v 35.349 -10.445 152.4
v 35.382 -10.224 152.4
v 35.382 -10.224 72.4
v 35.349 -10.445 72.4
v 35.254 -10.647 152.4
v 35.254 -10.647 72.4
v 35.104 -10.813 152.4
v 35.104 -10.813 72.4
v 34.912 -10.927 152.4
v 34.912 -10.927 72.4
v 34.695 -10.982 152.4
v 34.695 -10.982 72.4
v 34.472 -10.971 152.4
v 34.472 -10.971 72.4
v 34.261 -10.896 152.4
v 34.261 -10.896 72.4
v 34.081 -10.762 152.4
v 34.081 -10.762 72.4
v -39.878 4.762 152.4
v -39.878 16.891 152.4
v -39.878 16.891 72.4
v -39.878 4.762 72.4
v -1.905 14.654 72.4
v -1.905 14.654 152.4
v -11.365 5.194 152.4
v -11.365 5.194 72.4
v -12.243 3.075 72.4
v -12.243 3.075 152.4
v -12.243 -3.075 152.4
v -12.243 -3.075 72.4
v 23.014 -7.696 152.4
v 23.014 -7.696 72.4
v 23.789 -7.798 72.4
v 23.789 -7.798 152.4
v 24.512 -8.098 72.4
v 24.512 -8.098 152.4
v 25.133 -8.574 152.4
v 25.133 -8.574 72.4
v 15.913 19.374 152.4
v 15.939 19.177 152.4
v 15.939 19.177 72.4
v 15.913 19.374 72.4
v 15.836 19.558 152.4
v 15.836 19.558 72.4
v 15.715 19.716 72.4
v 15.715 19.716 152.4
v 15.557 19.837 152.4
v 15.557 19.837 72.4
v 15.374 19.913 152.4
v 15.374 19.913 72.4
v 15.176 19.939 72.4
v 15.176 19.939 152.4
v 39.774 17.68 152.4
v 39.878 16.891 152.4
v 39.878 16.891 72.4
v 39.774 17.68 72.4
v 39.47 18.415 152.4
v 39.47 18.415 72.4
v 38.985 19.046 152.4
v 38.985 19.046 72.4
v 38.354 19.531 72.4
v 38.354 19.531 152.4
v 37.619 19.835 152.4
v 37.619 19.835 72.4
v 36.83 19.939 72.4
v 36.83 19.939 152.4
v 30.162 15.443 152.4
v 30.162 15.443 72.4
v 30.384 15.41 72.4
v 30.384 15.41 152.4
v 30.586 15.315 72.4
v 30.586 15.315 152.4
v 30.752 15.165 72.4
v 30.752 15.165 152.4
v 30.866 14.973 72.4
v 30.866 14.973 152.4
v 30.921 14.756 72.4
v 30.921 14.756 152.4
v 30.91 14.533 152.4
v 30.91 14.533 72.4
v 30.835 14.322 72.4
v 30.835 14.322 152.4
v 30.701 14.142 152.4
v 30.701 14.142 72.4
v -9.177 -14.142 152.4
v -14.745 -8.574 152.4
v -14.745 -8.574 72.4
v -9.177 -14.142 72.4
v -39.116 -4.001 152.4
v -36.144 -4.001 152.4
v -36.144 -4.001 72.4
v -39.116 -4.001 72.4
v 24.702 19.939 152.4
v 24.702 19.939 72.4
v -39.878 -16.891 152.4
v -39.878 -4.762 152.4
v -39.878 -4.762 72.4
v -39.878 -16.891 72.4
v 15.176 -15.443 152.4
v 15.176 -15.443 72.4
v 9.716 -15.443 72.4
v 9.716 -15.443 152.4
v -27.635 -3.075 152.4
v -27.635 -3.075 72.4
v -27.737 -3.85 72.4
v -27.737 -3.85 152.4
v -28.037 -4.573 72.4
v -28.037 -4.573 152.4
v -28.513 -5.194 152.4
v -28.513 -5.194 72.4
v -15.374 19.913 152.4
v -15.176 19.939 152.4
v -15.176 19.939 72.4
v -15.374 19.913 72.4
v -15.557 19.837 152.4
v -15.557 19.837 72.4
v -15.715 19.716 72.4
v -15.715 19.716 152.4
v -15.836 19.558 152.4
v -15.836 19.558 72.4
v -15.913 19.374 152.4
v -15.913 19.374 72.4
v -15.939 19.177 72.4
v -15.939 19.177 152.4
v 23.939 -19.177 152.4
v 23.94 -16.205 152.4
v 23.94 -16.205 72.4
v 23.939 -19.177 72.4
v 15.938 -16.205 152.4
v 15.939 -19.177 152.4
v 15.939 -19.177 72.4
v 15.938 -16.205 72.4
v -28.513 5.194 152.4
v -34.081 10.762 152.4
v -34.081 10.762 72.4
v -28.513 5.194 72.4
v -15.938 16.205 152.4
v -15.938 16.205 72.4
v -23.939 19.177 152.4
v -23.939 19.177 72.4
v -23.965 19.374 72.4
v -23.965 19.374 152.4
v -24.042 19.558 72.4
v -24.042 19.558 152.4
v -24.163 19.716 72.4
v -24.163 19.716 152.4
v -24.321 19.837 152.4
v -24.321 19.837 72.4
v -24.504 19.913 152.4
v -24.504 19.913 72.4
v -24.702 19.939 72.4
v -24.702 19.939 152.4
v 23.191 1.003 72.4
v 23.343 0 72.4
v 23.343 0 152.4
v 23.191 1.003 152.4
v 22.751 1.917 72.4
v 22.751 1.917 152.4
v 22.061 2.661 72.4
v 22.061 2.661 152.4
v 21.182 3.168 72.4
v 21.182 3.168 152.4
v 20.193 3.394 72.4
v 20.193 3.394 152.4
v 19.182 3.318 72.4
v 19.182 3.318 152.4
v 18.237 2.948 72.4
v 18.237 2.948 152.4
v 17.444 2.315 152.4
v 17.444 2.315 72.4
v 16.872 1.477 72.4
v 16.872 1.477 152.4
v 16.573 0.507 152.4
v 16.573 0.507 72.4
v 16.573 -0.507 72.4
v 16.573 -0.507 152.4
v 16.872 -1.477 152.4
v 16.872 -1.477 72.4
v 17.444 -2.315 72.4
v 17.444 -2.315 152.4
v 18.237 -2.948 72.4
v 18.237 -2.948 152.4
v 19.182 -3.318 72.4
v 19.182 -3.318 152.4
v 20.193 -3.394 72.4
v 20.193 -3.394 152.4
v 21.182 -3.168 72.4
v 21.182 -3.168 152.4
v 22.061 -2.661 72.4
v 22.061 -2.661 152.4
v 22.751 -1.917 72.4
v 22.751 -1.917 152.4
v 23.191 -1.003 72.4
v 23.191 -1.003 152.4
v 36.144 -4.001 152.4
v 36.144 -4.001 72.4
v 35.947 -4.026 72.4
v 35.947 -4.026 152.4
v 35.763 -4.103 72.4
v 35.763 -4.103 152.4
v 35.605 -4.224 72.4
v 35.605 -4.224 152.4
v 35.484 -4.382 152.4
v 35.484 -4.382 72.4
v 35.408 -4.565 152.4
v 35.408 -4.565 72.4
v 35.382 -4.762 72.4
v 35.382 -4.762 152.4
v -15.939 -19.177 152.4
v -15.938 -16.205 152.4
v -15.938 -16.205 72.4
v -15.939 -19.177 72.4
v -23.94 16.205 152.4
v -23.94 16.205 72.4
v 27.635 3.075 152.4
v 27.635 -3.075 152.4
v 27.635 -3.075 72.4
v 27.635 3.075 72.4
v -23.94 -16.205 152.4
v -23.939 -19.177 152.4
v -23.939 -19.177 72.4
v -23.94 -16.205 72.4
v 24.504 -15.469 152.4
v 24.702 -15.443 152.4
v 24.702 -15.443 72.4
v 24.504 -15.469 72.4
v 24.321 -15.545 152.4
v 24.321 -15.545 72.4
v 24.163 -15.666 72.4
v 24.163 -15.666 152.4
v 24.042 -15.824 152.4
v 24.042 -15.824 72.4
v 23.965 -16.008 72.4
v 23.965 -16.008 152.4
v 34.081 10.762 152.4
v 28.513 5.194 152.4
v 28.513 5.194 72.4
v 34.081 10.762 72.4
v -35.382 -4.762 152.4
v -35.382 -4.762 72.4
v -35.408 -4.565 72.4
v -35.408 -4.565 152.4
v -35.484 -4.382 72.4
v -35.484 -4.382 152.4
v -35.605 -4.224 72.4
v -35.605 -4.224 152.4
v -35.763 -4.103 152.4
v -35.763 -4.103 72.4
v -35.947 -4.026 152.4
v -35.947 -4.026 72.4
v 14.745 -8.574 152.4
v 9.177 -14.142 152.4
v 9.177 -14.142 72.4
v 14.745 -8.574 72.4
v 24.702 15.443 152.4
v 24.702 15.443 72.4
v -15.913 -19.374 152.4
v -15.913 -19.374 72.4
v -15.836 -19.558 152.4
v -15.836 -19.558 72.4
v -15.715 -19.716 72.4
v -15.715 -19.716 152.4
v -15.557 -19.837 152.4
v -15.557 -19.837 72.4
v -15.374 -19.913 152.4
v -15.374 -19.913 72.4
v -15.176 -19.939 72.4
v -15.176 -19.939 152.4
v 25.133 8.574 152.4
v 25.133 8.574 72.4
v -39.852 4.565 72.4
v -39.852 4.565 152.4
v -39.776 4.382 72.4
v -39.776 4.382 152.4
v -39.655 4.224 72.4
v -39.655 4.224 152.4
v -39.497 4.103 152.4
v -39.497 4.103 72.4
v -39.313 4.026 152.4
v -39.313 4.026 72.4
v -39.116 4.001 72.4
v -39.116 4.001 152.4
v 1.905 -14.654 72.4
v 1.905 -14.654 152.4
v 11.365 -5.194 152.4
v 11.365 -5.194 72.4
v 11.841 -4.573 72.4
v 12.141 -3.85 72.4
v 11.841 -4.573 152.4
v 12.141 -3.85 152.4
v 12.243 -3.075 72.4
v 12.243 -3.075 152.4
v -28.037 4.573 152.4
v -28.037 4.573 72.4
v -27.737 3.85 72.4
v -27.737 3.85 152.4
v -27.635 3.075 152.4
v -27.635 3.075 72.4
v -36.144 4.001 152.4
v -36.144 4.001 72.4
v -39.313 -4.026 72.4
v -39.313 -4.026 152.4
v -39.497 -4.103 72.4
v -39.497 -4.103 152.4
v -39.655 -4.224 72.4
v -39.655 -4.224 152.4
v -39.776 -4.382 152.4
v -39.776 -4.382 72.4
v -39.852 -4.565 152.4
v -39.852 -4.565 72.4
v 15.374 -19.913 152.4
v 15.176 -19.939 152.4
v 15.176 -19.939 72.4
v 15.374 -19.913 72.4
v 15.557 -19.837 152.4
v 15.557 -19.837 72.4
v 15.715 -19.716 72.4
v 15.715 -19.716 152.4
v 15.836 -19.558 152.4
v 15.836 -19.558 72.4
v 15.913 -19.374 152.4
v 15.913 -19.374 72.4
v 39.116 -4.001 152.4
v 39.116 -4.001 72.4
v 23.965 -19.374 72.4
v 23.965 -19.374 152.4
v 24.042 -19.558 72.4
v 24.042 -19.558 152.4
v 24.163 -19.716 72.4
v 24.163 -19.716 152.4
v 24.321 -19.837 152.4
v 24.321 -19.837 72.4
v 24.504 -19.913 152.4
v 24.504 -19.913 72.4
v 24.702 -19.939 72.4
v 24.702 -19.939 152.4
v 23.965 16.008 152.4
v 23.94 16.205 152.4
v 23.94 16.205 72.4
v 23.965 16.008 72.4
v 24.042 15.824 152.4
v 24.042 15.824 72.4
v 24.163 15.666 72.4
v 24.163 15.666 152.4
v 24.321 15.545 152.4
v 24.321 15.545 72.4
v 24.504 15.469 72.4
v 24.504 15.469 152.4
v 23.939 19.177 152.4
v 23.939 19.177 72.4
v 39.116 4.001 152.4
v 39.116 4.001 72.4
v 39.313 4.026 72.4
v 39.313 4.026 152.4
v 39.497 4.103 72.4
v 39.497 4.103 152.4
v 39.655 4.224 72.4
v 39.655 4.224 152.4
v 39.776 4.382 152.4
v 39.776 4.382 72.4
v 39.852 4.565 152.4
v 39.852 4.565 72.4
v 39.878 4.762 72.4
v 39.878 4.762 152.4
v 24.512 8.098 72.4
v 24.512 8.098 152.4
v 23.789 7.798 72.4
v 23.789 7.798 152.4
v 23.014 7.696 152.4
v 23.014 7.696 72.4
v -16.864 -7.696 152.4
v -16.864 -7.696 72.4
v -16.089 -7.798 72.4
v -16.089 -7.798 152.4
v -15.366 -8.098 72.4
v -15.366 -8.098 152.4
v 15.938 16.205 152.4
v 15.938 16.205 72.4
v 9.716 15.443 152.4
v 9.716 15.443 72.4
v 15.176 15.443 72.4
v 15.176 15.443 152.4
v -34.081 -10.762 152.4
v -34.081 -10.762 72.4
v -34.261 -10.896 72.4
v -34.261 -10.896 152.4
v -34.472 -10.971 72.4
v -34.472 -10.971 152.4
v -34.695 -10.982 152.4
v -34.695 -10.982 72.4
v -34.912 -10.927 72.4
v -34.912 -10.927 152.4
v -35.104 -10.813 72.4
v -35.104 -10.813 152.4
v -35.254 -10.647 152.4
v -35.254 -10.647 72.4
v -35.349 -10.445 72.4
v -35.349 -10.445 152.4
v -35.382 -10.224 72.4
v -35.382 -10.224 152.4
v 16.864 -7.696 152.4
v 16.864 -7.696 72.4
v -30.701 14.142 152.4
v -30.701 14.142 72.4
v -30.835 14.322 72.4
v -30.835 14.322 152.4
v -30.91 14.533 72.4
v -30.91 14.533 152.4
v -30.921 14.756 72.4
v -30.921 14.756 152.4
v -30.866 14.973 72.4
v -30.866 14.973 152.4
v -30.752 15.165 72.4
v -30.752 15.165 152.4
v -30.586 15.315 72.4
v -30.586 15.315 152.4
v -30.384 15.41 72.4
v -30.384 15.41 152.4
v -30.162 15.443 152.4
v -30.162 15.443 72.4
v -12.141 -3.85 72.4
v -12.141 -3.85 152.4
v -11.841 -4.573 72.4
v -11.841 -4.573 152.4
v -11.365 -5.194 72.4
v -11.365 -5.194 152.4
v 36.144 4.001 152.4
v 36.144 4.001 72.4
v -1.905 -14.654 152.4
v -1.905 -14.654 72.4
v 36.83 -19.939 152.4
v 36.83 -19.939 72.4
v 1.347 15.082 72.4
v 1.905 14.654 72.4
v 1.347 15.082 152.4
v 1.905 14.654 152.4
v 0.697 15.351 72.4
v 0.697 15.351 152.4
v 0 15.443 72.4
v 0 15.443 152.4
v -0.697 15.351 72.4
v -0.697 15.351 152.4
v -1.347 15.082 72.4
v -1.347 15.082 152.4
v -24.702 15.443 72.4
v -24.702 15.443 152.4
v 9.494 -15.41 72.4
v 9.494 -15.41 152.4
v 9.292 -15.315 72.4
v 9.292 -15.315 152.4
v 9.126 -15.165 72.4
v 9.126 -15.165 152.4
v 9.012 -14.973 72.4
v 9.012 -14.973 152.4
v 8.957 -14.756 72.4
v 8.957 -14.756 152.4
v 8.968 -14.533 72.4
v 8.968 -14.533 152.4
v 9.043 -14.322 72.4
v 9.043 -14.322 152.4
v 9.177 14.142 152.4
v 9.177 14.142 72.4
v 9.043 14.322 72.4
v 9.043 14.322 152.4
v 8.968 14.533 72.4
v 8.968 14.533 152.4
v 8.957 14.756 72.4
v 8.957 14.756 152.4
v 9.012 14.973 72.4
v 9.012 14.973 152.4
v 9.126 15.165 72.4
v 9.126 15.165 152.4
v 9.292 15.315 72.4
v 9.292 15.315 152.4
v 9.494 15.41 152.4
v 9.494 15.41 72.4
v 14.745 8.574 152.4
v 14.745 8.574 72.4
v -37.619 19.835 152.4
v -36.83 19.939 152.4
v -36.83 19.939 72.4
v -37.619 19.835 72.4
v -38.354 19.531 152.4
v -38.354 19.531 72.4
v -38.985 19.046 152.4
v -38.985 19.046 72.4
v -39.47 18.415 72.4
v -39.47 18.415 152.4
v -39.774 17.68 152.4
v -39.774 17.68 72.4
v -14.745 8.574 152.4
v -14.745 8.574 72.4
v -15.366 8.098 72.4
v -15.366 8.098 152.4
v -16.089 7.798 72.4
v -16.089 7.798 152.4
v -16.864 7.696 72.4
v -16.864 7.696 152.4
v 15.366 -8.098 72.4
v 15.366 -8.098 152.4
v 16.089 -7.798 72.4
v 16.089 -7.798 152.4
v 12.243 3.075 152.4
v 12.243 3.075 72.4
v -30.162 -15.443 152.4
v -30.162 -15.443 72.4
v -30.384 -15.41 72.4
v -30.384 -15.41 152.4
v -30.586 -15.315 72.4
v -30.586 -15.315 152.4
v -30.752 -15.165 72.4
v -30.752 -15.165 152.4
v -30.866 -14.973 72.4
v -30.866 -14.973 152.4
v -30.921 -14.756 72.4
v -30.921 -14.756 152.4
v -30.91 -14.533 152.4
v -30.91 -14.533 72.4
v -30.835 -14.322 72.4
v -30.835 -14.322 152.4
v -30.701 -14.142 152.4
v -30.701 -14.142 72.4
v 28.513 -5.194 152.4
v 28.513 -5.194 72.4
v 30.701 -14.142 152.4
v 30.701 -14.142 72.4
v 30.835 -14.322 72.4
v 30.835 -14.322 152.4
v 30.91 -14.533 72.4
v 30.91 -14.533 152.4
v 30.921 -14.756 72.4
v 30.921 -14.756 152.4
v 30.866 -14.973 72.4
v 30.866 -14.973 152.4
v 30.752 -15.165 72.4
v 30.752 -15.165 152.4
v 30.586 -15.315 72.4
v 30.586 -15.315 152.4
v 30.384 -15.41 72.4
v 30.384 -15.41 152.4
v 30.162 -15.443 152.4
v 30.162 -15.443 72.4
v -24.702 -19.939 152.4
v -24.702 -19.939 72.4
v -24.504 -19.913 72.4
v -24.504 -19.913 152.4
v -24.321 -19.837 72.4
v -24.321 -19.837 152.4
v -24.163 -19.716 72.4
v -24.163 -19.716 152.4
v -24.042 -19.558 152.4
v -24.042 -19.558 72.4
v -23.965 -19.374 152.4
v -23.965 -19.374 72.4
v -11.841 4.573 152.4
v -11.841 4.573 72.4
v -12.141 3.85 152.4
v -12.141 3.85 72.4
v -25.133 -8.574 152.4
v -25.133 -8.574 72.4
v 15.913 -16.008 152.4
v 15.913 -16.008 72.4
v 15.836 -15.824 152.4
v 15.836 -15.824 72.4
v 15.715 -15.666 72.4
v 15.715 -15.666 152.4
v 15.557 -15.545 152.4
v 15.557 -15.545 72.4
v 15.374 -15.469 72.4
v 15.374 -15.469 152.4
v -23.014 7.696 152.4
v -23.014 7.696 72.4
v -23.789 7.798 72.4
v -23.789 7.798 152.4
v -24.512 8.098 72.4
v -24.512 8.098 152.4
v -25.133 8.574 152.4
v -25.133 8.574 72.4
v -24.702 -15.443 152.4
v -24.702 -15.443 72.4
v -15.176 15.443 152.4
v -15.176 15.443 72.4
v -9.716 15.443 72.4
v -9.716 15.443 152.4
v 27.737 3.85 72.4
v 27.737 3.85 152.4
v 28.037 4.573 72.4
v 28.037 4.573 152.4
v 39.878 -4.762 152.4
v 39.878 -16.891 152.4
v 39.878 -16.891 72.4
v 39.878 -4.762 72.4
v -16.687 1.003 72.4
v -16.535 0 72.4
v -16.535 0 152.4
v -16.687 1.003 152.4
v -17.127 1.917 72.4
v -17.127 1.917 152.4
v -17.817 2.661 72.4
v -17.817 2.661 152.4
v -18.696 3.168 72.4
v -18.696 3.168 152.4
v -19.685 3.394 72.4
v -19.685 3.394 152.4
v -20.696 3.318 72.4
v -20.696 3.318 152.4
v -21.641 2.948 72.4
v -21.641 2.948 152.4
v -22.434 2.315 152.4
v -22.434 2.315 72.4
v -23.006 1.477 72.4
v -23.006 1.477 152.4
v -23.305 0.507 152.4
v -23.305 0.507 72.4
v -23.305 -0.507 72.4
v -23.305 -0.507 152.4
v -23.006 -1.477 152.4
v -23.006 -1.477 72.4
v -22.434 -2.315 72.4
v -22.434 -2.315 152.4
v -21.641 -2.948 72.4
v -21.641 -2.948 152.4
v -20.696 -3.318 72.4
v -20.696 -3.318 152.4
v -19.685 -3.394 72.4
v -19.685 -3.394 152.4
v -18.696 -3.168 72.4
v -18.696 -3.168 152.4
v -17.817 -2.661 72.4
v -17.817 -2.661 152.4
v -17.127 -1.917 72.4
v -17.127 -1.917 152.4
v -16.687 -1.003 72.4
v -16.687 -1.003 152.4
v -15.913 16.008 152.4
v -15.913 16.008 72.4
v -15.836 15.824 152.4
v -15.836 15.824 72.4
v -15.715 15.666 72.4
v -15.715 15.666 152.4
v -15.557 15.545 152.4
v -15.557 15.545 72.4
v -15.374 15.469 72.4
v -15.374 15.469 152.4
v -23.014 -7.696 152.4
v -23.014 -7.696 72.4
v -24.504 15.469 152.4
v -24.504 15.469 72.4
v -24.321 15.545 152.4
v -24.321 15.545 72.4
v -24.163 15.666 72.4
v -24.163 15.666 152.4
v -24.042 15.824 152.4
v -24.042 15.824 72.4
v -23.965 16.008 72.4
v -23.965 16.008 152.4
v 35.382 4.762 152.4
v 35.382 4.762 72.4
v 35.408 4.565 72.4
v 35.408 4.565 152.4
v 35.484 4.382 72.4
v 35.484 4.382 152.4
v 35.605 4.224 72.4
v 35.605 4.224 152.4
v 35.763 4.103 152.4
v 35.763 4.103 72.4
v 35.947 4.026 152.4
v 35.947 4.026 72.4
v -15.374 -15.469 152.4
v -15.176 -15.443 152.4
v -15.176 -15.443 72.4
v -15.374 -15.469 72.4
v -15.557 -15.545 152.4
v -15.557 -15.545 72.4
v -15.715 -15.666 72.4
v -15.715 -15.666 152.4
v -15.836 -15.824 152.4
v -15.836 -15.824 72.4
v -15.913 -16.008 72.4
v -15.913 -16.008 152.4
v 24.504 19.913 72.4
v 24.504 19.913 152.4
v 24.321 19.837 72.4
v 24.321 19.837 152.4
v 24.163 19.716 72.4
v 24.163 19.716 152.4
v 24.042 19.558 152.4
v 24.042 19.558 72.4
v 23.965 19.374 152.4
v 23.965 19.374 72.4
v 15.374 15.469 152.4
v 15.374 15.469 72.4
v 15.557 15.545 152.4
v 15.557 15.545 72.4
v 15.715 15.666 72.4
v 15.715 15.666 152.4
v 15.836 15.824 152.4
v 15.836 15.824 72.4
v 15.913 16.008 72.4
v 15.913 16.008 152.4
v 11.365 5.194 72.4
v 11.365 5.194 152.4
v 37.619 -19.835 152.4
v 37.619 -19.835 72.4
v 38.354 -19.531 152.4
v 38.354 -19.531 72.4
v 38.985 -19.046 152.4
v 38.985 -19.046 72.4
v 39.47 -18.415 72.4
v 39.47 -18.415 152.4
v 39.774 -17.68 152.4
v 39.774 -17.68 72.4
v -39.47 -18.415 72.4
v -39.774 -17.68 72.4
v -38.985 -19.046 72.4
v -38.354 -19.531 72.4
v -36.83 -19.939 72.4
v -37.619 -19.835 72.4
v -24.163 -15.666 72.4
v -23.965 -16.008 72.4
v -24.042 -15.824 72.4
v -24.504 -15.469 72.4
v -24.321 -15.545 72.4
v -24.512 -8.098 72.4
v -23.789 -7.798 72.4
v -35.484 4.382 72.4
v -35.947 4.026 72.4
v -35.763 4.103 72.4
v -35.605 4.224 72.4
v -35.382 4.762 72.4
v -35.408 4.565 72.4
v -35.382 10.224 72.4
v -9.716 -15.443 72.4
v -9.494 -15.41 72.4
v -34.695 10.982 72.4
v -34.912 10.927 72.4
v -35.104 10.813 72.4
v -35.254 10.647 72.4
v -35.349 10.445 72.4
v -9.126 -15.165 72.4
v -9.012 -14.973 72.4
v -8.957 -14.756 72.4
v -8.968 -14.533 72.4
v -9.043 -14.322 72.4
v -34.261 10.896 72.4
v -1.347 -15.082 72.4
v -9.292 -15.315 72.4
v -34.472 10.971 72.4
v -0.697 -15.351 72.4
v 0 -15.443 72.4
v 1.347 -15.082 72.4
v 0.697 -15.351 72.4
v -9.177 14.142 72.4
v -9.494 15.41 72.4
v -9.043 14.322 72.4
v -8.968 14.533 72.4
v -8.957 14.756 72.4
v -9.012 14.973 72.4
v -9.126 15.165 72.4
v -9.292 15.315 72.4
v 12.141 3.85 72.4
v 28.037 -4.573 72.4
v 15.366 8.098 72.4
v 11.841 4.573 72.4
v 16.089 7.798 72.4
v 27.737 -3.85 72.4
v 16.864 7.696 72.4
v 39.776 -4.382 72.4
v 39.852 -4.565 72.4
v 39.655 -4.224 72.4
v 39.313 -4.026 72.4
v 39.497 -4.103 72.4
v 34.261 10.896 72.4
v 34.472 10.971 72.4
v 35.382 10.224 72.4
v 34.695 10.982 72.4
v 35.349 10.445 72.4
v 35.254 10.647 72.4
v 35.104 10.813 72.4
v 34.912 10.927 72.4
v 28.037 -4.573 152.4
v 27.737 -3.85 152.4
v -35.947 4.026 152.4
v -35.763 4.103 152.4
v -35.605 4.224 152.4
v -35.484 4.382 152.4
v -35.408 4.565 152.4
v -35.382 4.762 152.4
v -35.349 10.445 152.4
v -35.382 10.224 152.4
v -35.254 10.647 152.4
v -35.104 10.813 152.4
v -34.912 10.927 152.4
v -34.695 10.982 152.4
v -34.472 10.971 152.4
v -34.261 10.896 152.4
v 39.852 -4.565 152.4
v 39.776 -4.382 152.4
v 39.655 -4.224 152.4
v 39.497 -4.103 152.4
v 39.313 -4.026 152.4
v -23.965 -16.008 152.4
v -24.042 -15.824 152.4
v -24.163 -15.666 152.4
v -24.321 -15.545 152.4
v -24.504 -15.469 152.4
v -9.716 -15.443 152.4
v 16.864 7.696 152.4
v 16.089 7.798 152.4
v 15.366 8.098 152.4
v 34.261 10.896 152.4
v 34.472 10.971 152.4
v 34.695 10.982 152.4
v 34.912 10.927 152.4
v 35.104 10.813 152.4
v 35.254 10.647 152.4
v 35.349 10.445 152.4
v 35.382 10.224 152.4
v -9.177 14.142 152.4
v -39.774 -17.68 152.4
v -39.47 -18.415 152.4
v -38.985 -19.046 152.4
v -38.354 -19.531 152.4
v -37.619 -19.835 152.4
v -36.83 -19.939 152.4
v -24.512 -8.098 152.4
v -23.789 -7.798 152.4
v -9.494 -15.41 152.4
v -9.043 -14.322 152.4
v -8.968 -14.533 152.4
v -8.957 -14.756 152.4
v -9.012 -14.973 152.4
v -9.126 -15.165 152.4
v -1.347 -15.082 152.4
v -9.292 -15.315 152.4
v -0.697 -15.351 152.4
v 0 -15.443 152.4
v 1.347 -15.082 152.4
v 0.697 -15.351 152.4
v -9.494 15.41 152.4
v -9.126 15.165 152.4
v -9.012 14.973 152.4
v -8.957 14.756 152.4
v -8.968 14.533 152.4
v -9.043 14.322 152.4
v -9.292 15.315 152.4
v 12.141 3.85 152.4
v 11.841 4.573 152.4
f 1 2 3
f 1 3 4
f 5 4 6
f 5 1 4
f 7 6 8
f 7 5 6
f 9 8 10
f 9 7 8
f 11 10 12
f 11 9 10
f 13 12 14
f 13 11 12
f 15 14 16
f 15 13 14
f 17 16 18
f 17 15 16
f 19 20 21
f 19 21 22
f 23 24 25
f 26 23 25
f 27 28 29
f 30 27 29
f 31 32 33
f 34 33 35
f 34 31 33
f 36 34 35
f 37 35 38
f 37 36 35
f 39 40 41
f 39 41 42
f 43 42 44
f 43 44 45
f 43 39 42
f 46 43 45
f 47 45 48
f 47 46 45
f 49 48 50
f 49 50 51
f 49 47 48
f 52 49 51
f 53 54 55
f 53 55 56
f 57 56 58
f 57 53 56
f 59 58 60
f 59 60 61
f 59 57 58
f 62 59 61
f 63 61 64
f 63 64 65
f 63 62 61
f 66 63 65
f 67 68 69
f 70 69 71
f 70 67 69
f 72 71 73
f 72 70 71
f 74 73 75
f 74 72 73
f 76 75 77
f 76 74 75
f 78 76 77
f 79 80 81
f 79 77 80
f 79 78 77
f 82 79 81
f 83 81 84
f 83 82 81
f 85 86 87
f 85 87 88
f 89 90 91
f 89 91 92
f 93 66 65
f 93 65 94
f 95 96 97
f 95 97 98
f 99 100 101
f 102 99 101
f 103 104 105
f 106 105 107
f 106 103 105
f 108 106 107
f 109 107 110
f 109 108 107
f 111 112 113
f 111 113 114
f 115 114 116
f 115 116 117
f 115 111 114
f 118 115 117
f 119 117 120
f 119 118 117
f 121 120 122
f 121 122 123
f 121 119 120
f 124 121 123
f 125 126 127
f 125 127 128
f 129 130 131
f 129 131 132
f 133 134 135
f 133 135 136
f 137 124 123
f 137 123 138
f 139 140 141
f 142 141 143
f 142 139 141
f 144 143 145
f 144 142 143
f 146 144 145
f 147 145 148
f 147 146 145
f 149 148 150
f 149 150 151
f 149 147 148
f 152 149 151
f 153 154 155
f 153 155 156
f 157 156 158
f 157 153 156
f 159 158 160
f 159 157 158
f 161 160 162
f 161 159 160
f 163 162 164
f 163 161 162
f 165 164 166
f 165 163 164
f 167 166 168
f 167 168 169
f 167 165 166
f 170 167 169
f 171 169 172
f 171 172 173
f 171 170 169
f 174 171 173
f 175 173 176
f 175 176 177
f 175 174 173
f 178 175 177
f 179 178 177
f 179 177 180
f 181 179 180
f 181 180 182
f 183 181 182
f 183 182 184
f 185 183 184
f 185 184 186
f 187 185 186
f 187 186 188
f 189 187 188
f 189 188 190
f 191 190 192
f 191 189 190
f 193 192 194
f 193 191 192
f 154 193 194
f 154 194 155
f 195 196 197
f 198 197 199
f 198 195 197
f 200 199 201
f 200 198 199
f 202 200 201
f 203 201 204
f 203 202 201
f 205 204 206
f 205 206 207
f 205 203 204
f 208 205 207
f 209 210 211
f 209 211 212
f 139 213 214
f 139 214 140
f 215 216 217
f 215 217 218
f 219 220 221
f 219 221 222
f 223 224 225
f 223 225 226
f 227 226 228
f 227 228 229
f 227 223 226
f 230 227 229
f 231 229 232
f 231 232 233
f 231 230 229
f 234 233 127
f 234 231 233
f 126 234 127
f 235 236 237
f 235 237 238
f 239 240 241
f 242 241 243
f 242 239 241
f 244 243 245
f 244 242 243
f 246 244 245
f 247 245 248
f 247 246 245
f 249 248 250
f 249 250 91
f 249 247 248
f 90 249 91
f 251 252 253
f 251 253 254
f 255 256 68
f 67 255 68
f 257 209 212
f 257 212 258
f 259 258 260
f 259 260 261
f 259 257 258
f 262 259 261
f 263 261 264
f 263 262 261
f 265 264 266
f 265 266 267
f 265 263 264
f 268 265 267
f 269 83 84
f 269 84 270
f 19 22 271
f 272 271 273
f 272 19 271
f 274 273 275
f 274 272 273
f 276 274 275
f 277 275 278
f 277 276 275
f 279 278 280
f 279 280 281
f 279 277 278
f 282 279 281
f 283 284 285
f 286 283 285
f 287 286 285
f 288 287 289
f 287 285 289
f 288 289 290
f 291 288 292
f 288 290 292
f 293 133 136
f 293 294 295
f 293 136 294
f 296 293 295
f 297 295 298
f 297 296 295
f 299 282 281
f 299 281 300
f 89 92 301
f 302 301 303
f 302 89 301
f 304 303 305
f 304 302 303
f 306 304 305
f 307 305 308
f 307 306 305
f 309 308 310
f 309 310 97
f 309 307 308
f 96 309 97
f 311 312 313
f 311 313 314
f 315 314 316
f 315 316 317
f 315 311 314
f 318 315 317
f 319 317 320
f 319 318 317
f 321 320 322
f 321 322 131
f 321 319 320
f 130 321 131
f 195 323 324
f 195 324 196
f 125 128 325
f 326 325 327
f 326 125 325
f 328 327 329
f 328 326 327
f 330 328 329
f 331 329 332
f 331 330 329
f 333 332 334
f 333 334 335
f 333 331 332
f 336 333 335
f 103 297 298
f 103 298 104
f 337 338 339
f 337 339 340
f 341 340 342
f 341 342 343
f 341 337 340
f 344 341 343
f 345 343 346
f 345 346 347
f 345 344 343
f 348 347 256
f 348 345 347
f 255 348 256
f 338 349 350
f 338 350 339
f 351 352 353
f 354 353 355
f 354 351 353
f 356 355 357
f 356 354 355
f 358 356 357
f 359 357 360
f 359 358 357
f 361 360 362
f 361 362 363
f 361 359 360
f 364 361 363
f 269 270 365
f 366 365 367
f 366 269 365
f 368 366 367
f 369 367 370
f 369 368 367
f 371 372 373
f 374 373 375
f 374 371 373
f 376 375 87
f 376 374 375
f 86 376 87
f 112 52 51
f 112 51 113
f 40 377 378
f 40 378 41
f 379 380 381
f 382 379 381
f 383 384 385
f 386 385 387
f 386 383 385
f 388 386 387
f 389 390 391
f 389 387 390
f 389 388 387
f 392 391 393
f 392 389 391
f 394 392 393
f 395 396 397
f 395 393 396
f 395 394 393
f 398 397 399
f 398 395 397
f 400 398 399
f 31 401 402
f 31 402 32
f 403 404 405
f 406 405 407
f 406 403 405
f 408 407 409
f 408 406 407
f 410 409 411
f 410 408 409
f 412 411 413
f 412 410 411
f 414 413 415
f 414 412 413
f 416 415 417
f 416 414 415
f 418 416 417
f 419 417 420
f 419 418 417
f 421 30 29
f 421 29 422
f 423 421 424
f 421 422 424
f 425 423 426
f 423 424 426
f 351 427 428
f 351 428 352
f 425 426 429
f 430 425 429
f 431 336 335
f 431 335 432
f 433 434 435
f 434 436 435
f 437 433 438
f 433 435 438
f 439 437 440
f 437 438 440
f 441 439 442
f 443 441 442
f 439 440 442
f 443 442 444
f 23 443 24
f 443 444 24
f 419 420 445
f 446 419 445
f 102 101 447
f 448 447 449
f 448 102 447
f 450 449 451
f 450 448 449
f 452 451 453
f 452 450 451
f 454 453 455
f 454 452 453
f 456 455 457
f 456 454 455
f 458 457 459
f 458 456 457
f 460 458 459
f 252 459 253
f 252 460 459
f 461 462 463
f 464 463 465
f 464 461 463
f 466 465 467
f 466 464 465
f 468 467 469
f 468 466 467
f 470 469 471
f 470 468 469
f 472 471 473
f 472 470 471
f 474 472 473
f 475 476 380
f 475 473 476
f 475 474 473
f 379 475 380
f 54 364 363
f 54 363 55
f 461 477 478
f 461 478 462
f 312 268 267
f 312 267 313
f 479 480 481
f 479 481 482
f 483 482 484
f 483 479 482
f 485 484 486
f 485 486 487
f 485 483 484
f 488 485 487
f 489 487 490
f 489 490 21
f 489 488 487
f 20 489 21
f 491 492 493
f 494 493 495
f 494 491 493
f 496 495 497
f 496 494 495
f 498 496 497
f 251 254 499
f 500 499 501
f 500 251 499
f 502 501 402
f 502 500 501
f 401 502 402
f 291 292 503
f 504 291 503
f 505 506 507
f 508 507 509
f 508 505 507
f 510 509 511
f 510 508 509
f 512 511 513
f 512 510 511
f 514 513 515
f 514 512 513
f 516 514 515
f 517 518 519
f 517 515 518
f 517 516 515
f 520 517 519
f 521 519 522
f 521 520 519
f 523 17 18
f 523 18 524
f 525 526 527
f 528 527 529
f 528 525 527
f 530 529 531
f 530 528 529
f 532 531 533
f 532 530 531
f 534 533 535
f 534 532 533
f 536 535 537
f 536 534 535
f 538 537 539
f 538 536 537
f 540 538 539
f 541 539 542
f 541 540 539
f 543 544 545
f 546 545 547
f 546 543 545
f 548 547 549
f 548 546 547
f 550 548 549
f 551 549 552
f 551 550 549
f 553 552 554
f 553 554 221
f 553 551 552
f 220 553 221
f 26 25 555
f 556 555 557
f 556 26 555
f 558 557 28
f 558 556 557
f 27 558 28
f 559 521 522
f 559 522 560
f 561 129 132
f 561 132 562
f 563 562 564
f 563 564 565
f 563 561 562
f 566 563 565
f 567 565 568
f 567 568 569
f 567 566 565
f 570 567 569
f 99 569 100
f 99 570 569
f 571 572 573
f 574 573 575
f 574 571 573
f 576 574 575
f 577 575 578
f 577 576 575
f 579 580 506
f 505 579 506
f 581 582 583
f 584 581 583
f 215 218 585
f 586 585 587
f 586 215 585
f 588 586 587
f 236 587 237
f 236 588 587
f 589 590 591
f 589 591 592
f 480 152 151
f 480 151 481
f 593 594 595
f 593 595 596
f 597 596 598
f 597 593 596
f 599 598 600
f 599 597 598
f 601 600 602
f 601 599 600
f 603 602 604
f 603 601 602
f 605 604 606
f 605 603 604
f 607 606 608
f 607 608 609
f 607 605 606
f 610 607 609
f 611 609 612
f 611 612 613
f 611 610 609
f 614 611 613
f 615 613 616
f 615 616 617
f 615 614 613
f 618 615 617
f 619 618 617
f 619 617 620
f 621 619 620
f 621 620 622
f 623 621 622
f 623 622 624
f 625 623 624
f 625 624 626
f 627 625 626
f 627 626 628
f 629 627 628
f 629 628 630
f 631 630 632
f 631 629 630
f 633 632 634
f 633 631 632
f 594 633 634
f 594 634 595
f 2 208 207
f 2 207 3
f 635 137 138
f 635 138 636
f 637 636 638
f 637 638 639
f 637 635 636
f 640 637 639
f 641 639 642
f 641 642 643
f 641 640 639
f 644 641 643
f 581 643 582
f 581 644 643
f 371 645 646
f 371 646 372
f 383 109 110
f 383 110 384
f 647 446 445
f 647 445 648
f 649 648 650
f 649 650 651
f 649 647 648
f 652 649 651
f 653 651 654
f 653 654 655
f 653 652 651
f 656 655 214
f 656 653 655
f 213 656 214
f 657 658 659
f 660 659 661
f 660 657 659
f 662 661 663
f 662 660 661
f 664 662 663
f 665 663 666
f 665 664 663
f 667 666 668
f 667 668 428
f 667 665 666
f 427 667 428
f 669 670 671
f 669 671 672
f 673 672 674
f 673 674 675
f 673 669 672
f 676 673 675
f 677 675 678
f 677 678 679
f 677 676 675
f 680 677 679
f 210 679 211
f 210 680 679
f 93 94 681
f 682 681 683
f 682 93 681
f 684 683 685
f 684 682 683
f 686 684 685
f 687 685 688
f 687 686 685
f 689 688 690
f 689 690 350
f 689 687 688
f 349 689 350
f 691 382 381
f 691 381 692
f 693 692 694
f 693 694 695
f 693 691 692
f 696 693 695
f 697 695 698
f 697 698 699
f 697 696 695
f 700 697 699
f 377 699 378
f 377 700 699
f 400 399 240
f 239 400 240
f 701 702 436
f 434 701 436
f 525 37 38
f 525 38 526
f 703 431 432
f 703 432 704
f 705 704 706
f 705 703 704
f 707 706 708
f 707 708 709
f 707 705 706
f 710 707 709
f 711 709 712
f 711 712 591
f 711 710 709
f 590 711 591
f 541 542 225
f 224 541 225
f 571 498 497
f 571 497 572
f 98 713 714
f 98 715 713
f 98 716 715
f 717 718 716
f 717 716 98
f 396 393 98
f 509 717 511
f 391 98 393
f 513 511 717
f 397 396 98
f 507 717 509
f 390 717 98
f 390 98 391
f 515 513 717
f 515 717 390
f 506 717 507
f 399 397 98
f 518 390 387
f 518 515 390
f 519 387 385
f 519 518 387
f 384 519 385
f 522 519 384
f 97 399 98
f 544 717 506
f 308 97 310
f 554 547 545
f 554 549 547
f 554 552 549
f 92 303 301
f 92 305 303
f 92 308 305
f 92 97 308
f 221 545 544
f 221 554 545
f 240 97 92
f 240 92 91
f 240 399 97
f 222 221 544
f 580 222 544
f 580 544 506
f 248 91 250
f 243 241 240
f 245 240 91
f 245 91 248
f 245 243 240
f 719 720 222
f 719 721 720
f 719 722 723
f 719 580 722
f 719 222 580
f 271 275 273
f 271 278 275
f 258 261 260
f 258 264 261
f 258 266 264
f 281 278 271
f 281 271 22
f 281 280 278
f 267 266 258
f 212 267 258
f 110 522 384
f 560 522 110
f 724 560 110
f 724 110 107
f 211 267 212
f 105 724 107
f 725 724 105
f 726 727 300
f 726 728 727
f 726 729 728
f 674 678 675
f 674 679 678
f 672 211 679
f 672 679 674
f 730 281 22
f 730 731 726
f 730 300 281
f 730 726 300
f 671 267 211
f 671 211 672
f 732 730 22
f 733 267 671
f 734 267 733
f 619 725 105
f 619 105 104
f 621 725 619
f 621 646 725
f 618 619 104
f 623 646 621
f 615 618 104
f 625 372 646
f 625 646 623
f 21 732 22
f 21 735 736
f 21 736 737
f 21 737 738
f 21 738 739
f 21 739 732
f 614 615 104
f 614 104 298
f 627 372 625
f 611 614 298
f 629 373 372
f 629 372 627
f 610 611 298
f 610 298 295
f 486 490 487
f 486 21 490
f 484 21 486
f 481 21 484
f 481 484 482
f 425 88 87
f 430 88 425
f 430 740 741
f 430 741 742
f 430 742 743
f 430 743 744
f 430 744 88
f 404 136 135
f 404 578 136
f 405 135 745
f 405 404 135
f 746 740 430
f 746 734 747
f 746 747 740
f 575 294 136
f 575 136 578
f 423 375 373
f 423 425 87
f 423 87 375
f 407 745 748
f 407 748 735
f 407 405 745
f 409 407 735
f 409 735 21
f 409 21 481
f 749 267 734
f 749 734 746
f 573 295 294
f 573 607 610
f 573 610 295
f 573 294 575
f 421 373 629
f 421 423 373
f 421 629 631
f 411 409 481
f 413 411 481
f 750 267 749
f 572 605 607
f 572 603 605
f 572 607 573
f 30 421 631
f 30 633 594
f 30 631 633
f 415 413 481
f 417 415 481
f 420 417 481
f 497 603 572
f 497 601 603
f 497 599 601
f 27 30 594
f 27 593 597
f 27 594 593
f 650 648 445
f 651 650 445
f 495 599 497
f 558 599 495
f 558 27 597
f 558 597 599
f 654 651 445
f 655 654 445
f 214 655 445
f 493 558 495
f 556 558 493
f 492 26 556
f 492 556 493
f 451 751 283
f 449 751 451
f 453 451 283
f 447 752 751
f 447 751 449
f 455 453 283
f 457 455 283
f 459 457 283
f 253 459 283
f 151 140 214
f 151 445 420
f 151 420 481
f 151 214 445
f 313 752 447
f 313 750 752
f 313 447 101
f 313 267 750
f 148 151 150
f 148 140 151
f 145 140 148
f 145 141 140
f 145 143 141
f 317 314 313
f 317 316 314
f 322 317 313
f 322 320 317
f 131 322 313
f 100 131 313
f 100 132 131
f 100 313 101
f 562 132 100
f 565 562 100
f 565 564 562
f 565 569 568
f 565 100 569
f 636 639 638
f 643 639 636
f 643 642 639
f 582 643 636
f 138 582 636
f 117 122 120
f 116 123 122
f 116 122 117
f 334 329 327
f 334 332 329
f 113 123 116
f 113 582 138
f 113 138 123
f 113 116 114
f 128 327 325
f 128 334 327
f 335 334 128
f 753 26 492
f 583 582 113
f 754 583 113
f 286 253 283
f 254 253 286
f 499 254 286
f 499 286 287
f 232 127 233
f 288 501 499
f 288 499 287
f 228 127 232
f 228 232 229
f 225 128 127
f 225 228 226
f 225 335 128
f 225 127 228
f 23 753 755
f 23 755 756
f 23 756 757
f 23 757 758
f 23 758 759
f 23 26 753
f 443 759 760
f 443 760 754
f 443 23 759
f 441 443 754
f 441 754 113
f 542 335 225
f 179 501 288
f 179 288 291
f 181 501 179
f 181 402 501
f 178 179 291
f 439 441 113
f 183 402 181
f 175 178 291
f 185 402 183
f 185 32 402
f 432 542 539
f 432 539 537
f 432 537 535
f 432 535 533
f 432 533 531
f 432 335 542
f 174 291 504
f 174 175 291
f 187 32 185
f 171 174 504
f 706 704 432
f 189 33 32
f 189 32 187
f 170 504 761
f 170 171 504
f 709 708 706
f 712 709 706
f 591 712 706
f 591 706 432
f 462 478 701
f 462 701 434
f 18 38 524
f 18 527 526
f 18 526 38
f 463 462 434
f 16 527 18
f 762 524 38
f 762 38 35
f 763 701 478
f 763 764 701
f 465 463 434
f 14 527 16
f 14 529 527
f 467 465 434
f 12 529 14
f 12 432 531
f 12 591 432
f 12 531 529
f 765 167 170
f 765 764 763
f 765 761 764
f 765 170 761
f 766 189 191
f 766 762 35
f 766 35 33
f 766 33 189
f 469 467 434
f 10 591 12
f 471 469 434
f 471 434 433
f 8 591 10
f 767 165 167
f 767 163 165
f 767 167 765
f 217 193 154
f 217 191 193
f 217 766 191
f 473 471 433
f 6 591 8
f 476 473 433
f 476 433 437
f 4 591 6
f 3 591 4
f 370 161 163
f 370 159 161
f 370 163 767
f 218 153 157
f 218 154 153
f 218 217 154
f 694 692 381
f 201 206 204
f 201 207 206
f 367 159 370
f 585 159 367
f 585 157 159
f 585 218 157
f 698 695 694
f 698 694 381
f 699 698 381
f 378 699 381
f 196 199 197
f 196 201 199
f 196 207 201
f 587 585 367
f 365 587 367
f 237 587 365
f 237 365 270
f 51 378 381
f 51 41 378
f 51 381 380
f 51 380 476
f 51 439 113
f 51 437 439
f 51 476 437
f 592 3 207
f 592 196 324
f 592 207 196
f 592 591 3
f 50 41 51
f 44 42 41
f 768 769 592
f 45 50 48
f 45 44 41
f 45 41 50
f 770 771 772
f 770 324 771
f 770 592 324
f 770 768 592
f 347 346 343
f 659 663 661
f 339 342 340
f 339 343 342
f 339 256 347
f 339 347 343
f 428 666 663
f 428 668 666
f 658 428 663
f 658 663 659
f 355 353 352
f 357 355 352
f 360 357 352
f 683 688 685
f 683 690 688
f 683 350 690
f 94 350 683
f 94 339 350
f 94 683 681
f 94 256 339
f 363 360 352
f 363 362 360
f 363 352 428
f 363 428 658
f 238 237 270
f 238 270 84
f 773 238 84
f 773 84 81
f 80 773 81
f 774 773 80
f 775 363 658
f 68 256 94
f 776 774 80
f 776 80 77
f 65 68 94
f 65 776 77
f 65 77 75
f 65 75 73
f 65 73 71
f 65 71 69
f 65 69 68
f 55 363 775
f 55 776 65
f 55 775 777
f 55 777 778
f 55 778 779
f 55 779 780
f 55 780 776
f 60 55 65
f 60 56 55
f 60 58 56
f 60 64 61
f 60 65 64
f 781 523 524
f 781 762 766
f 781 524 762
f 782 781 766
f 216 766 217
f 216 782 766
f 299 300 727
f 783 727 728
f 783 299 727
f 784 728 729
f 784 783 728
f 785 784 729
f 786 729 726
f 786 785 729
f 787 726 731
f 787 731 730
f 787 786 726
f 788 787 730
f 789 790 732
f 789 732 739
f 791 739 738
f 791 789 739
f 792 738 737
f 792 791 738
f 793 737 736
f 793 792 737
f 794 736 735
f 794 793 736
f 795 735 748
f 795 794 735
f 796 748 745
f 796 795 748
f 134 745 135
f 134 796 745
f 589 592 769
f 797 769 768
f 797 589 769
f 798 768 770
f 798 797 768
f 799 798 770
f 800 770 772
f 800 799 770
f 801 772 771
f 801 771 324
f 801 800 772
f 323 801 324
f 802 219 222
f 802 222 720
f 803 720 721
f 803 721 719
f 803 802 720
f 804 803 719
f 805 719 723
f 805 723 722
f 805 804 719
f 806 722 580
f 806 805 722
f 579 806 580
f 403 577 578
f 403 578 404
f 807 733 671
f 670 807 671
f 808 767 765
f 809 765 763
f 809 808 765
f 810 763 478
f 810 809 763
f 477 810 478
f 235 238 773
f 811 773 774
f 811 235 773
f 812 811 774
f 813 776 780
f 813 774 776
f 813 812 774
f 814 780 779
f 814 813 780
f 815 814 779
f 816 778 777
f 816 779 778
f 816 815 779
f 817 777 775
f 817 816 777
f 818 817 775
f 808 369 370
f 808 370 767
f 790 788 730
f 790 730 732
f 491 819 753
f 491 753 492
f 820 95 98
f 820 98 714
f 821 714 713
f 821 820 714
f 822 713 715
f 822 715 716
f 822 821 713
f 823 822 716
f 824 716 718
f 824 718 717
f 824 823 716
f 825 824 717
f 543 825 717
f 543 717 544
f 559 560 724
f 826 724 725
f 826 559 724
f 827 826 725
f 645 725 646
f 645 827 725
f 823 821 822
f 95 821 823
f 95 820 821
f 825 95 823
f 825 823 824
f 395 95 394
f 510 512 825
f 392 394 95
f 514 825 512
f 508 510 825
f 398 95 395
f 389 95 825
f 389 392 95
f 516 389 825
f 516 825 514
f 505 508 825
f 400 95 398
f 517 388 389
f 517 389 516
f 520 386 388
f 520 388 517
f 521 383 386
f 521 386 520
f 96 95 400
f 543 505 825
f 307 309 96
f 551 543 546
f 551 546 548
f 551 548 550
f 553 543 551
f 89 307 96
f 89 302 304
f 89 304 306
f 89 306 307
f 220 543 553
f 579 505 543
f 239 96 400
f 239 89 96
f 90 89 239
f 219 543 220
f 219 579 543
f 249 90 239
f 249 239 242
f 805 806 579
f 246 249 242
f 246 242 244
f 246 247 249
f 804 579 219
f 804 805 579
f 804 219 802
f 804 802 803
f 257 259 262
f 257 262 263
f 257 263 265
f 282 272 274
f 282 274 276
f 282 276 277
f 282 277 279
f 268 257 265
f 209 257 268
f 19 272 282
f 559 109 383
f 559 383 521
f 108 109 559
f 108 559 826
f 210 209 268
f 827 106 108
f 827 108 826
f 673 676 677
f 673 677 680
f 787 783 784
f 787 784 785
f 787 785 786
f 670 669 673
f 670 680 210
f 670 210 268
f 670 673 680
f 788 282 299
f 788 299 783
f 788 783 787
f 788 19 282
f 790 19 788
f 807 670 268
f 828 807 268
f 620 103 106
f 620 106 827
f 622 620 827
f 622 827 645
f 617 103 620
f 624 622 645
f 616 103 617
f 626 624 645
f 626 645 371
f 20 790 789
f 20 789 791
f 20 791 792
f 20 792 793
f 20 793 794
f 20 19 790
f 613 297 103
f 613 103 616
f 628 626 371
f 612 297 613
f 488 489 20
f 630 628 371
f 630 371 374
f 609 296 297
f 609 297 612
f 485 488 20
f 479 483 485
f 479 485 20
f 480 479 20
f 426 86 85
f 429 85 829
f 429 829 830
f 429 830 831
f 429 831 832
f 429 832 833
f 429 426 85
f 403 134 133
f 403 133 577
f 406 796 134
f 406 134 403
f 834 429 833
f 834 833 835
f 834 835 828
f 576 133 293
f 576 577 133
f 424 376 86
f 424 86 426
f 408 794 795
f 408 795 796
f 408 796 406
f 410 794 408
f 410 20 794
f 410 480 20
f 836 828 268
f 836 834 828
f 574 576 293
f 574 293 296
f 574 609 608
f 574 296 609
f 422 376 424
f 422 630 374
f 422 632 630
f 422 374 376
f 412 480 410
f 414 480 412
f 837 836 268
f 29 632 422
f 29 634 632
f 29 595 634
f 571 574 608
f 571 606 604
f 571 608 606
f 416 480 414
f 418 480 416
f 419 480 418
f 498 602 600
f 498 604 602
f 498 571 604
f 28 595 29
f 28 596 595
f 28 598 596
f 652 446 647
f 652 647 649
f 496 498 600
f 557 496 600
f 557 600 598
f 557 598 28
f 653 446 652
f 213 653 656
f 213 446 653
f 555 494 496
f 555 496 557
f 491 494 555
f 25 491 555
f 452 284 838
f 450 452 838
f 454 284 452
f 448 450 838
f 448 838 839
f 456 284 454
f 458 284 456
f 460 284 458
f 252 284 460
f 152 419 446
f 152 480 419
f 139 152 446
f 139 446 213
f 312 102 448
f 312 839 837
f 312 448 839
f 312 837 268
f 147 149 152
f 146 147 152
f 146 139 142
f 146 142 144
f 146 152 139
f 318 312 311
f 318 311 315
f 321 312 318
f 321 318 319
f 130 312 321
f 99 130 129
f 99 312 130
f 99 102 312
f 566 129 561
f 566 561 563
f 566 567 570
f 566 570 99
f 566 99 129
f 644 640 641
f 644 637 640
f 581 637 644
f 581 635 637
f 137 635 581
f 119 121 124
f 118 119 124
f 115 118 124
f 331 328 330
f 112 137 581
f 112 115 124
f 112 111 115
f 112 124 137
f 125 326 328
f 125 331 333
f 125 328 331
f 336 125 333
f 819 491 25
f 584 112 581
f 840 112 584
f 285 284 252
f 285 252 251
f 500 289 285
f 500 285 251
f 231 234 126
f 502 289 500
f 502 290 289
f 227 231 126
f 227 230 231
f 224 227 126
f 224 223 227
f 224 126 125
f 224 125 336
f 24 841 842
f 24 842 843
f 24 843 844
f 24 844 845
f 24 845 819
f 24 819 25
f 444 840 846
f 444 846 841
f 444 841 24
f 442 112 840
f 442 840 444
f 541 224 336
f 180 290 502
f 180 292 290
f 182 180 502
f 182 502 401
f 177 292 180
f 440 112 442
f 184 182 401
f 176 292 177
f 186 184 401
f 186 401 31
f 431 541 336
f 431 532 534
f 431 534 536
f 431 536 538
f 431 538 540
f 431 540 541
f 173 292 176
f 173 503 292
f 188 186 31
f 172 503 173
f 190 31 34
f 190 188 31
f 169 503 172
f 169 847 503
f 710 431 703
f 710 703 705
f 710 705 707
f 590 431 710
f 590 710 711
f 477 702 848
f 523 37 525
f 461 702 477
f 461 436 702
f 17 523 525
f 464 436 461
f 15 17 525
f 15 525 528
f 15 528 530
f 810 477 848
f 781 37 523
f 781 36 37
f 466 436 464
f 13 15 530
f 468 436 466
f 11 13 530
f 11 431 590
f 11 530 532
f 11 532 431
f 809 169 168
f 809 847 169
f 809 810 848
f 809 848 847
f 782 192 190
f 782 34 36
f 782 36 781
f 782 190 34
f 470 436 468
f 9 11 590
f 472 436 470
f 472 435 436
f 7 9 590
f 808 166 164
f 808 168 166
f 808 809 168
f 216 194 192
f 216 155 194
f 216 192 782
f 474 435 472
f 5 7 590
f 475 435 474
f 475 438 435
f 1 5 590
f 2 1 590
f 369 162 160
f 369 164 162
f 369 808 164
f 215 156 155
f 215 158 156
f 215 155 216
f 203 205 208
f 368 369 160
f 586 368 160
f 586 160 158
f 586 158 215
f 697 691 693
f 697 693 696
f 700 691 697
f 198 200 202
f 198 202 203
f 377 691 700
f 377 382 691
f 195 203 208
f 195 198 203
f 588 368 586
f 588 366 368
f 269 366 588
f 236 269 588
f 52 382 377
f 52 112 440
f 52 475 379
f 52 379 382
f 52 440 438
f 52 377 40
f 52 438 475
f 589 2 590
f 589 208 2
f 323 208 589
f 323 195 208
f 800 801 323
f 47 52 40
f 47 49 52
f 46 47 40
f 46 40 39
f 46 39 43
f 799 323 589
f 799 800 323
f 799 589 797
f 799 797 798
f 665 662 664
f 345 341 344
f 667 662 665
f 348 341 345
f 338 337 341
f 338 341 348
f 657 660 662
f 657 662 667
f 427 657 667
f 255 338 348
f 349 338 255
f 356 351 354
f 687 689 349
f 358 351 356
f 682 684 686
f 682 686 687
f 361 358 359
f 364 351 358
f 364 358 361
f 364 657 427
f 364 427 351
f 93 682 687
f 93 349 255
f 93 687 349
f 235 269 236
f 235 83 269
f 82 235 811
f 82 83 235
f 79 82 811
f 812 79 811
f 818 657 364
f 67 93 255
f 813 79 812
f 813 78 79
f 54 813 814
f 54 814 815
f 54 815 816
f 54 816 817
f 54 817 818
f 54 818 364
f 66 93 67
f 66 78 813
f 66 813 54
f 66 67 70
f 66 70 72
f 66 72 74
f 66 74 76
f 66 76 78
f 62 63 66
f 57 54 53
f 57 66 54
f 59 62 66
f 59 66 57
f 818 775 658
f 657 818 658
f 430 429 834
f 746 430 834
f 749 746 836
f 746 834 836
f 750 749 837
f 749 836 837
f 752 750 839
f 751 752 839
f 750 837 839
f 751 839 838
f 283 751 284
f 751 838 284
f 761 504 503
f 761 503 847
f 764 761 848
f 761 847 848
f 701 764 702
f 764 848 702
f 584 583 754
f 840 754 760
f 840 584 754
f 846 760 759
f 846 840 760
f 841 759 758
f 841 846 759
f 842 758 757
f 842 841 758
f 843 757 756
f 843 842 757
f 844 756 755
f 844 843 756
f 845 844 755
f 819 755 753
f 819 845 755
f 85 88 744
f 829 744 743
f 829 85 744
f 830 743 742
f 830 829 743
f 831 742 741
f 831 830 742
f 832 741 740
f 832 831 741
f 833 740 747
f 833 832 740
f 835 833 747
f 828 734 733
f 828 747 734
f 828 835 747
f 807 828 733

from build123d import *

# Parameters (mm, degrees)
SKETCH1_R               = 3.4036
BOSS_EXTRUDE1_DEPTH     = 152.4
SKETCH2_W               = 224.8
SKETCH2_H               = 39.878
CUT_EXTRUDE1_DEPTH      = 40
CUT_EXTRUDE1_DEPTH_BACK = 40


with BuildPart() as part:
    # Sketch1 → Boss-Extrude1 (new body, symmetric)
    with BuildSketch(Plane.XY):
        with BuildLine():
            Line((-39.878, 16.891), (-39.878, 4.7625))
            ThreePointArc((-39.878, 4.7625), (-39.654815367, 4.223684633), (-39.116, 4.0005))
            Line((-39.116, 4.0005), (-36.1442, 4.0005))
            ThreePointArc((-36.1442, 4.0005), (-35.605384633, 4.223684633), (-35.3822, 4.7625))
            Line((-35.3822, 4.7625), (-35.3822, 10.2235))
            ThreePointArc((-35.3822, 10.2235), (-34.911804775, 10.927496204), (-34.081384633, 10.762315367))
            Line((-34.081384633, 10.762315367), (-28.513059555, 5.19399029))
            ThreePointArc((-28.513059555, 5.19399029), (-27.863348265, 4.221628629), (-27.6352, 3.074649845))
            Line((-27.6352, 3.074649845), (-27.6352, -3.074649845))
            ThreePointArc((-27.6352, -3.074649845), (-27.863348265, -4.221628629), (-28.513059555, -5.19399029))
            Line((-28.513059555, -5.19399029), (-34.081384633, -10.762315367))
            ThreePointArc((-34.081384633, -10.762315367), (-34.911804775, -10.927496204), (-35.3822, -10.2235))
            Line((-35.3822, -10.2235), (-35.3822, -4.7625))
            ThreePointArc((-35.3822, -4.7625), (-35.605384633, -4.223684633), (-36.1442, -4.0005))
            Line((-36.1442, -4.0005), (-39.116, -4.0005))
            ThreePointArc((-39.116, -4.0005), (-39.654815367, -4.223684633), (-39.878, -4.7625))
            Line((-39.878, -4.7625), (-39.878, -16.891))
            ThreePointArc((-39.878, -16.891), (-38.985261469, -19.046261469), (-36.83, -19.939))
            Line((-36.83, -19.939), (-24.7015, -19.939))
            ThreePointArc((-24.7015, -19.939), (-24.162684633, -19.715815367), (-23.9395, -19.177))
            Line((-23.9395, -19.177), (-23.9395, -16.2052))
            ThreePointArc((-23.9395, -16.2052), (-24.162684633, -15.666384633), (-24.7015, -15.4432))
            Line((-24.7015, -15.4432), (-30.1625, -15.4432))
            ThreePointArc((-30.1625, -15.4432), (-30.866496204, -14.972804775), (-30.701315367, -14.142384633))
            Line((-30.701315367, -14.142384633), (-25.13299029, -8.574059555))
            ThreePointArc((-25.13299029, -8.574059555), (-24.160628629, -7.924348265), (-23.013649845, -7.6962))
            Line((-23.013649845, -7.6962), (-16.864350155, -7.6962))
            ThreePointArc((-16.864350155, -7.6962), (-15.717371371, -7.924348265), (-14.74500971, -8.574059555))
            Line((-14.74500971, -8.574059555), (-9.176684633, -14.142384633))
            ThreePointArc((-9.176684633, -14.142384633), (-9.011503796, -14.972804775), (-9.7155, -15.4432))
            Line((-9.7155, -15.4432), (-15.1765, -15.4432))
            ThreePointArc((-15.1765, -15.4432), (-15.715315367, -15.666384633), (-15.9385, -16.2052))
            Line((-15.9385, -16.2052), (-15.9385, -19.177))
            ThreePointArc((-15.9385, -19.177), (-15.715315367, -19.715815367), (-15.1765, -19.939))
            Line((-15.1765, -19.939), (15.1765, -19.939))
            ThreePointArc((15.1765, -19.939), (15.715315367, -19.715815367), (15.9385, -19.177))
            Line((15.9385, -19.177), (15.9385, -16.2052))
            ThreePointArc((15.9385, -16.2052), (15.715315367, -15.666384633), (15.1765, -15.4432))
            Line((15.1765, -15.4432), (9.7155, -15.4432))
            ThreePointArc((9.7155, -15.4432), (9.011503796, -14.972804775), (9.176684633, -14.142384633))
            Line((9.176684633, -14.142384633), (14.74500971, -8.574059555))
            ThreePointArc((14.74500971, -8.574059555), (15.717371371, -7.924348265), (16.864350155, -7.6962))
            Line((16.864350155, -7.6962), (23.013649845, -7.6962))
            ThreePointArc((23.013649845, -7.6962), (24.160628629, -7.924348265), (25.13299029, -8.574059555))
            Line((25.13299029, -8.574059555), (30.701315367, -14.142384633))
            ThreePointArc((30.701315367, -14.142384633), (30.866496204, -14.972804775), (30.1625, -15.4432))
            Line((30.1625, -15.4432), (24.7015, -15.4432))
            ThreePointArc((24.7015, -15.4432), (24.162684633, -15.666384633), (23.9395, -16.2052))
            Line((23.9395, -16.2052), (23.9395, -19.177))
            ThreePointArc((23.9395, -19.177), (24.162684633, -19.715815367), (24.7015, -19.939))
            Line((24.7015, -19.939), (36.83, -19.939))
            ThreePointArc((36.83, -19.939), (38.985261469, -19.046261469), (39.878, -16.891))
            Line((39.878, -16.891), (39.878, -4.7625))
            ThreePointArc((39.878, -4.7625), (39.654815367, -4.223684633), (39.116, -4.0005))
            Line((39.116, -4.0005), (36.1442, -4.0005))
            ThreePointArc((36.1442, -4.0005), (35.605384633, -4.223684633), (35.3822, -4.7625))
            Line((35.3822, -4.7625), (35.3822, -10.2235))
            ThreePointArc((35.3822, -10.2235), (34.911804775, -10.927496204), (34.081384633, -10.762315367))
            Line((34.081384633, -10.762315367), (28.513059555, -5.19399029))
            ThreePointArc((28.513059555, -5.19399029), (27.863348265, -4.221628629), (27.6352, -3.074649845))
            Line((27.6352, -3.074649845), (27.6352, 3.074649845))
            ThreePointArc((27.6352, 3.074649845), (27.863348265, 4.221628629), (28.513059555, 5.19399029))
            Line((28.513059555, 5.19399029), (34.081384633, 10.762315367))
            ThreePointArc((34.081384633, 10.762315367), (34.911804775, 10.927496204), (35.3822, 10.2235))
            Line((35.3822, 10.2235), (35.3822, 4.7625))
            ThreePointArc((35.3822, 4.7625), (35.605384633, 4.223684633), (36.1442, 4.0005))
            Line((36.1442, 4.0005), (39.116, 4.0005))
            ThreePointArc((39.116, 4.0005), (39.654815367, 4.223684633), (39.878, 4.7625))
            Line((39.878, 4.7625), (39.878, 16.891))
            ThreePointArc((39.878, 16.891), (38.985261469, 19.046261469), (36.83, 19.939))
            Line((36.83, 19.939), (24.7015, 19.939))
            ThreePointArc((24.7015, 19.939), (24.162684633, 19.715815367), (23.9395, 19.177))
            Line((23.9395, 19.177), (23.9395, 16.2052))
            ThreePointArc((23.9395, 16.2052), (24.162684633, 15.666384633), (24.7015, 15.4432))
            Line((24.7015, 15.4432), (30.1625, 15.4432))
            ThreePointArc((30.1625, 15.4432), (30.866496204, 14.972804775), (30.701315367, 14.142384633))
            Line((30.701315367, 14.142384633), (25.13299029, 8.574059555))
            ThreePointArc((25.13299029, 8.574059555), (24.160628629, 7.924348265), (23.013649845, 7.6962))
            Line((23.013649845, 7.6962), (16.864350155, 7.6962))
            ThreePointArc((16.864350155, 7.6962), (15.717371371, 7.924348265), (14.74500971, 8.574059555))
            Line((14.74500971, 8.574059555), (9.176684633, 14.142384633))
            ThreePointArc((9.176684633, 14.142384633), (9.011503796, 14.972804775), (9.7155, 15.4432))
            Line((9.7155, 15.4432), (15.1765, 15.4432))
            ThreePointArc((15.1765, 15.4432), (15.715315367, 15.666384633), (15.9385, 16.2052))
            Line((15.9385, 16.2052), (15.9385, 19.177))
            ThreePointArc((15.9385, 19.177), (15.715315367, 19.715815367), (15.1765, 19.939))
            Line((15.1765, 19.939), (-15.1765, 19.939))
            ThreePointArc((-15.1765, 19.939), (-15.715315367, 19.715815367), (-15.9385, 19.177))
            Line((-15.9385, 19.177), (-15.9385, 16.2052))
            ThreePointArc((-15.9385, 16.2052), (-15.715315367, 15.666384633), (-15.1765, 15.4432))
            Line((-15.1765, 15.4432), (-9.7155, 15.4432))
            ThreePointArc((-9.7155, 15.4432), (-9.011503796, 14.972804775), (-9.176684633, 14.142384633))
            Line((-9.176684633, 14.142384633), (-14.74500971, 8.574059555))
            ThreePointArc((-14.74500971, 8.574059555), (-15.717371371, 7.924348265), (-16.864350155, 7.6962))
            Line((-16.864350155, 7.6962), (-23.013649845, 7.6962))
            ThreePointArc((-23.013649845, 7.6962), (-24.160628629, 7.924348265), (-25.13299029, 8.574059555))
            Line((-25.13299029, 8.574059555), (-30.701315367, 14.142384633))
            ThreePointArc((-30.701315367, 14.142384633), (-30.866496204, 14.972804775), (-30.1625, 15.4432))
            Line((-30.1625, 15.4432), (-24.7015, 15.4432))
            ThreePointArc((-24.7015, 15.4432), (-24.162684633, 15.666384633), (-23.9395, 16.2052))
            Line((-23.9395, 16.2052), (-23.9395, 19.177))
            ThreePointArc((-23.9395, 19.177), (-24.162684633, 19.715815367), (-24.7015, 19.939))
            Line((-24.7015, 19.939), (-36.83, 19.939))
            ThreePointArc((-36.83, 19.939), (-38.985261469, 19.046261469), (-39.878, 16.891))
        make_face()
        with Locations((-19.939, 0)):
            Circle(SKETCH1_R, mode=Mode.SUBTRACT)
        with Locations((19.939, 0)):
            Circle(SKETCH1_R, mode=Mode.SUBTRACT)
        with BuildLine():
            Line((-12.2428, 3.074649845), (-12.2428, -3.074649845))
            ThreePointArc((-12.2428, -3.074649845), (-12.014651735, -4.221628629), (-11.364940445, -5.19399029))
            Line((-11.364940445, -5.19399029), (-1.904671503, -14.654259232))
            ThreePointArc((-1.904671503, -14.654259232), (0, -15.4432), (1.904671503, -14.654259232))
            Line((1.904671503, -14.654259232), (11.364940445, -5.19399029))
            ThreePointArc((11.364940445, -5.19399029), (12.014651735, -4.221628629), (12.2428, -3.074649845))
            Line((12.2428, -3.074649845), (12.2428, 3.074649845))
            ThreePointArc((12.2428, 3.074649845), (12.014651735, 4.221628629), (11.364940445, 5.19399029))
            Line((11.364940445, 5.19399029), (1.904671503, 14.654259232))
            ThreePointArc((1.904671503, 14.654259232), (0, 15.4432), (-1.904671503, 14.654259232))
            Line((-1.904671503, 14.654259232), (-11.364940445, 5.19399029))
            ThreePointArc((-11.364940445, 5.19399029), (-12.014651735, 4.221628629), (-12.2428, 3.074649845))
        make_face(mode=Mode.SUBTRACT)
    extrude(amount=BOSS_EXTRUDE1_DEPTH, both=True)

    # Sketch2 → Cut-Extrude1 (cut, two sides)
    with BuildSketch(Plane(origin=(0, 0, 0), x_dir=(0, 0, -1), z_dir=(1, 0, 0))) as cut_extrude1_sk:
        with Locations((40, 0)):
            Rectangle(SKETCH2_W, SKETCH2_H)
    extrude(amount=CUT_EXTRUDE1_DEPTH, mode=Mode.SUBTRACT)
    extrude(cut_extrude1_sk.sketch, amount=-CUT_EXTRUDE1_DEPTH_BACK, mode=Mode.SUBTRACT)


solid = part.part
